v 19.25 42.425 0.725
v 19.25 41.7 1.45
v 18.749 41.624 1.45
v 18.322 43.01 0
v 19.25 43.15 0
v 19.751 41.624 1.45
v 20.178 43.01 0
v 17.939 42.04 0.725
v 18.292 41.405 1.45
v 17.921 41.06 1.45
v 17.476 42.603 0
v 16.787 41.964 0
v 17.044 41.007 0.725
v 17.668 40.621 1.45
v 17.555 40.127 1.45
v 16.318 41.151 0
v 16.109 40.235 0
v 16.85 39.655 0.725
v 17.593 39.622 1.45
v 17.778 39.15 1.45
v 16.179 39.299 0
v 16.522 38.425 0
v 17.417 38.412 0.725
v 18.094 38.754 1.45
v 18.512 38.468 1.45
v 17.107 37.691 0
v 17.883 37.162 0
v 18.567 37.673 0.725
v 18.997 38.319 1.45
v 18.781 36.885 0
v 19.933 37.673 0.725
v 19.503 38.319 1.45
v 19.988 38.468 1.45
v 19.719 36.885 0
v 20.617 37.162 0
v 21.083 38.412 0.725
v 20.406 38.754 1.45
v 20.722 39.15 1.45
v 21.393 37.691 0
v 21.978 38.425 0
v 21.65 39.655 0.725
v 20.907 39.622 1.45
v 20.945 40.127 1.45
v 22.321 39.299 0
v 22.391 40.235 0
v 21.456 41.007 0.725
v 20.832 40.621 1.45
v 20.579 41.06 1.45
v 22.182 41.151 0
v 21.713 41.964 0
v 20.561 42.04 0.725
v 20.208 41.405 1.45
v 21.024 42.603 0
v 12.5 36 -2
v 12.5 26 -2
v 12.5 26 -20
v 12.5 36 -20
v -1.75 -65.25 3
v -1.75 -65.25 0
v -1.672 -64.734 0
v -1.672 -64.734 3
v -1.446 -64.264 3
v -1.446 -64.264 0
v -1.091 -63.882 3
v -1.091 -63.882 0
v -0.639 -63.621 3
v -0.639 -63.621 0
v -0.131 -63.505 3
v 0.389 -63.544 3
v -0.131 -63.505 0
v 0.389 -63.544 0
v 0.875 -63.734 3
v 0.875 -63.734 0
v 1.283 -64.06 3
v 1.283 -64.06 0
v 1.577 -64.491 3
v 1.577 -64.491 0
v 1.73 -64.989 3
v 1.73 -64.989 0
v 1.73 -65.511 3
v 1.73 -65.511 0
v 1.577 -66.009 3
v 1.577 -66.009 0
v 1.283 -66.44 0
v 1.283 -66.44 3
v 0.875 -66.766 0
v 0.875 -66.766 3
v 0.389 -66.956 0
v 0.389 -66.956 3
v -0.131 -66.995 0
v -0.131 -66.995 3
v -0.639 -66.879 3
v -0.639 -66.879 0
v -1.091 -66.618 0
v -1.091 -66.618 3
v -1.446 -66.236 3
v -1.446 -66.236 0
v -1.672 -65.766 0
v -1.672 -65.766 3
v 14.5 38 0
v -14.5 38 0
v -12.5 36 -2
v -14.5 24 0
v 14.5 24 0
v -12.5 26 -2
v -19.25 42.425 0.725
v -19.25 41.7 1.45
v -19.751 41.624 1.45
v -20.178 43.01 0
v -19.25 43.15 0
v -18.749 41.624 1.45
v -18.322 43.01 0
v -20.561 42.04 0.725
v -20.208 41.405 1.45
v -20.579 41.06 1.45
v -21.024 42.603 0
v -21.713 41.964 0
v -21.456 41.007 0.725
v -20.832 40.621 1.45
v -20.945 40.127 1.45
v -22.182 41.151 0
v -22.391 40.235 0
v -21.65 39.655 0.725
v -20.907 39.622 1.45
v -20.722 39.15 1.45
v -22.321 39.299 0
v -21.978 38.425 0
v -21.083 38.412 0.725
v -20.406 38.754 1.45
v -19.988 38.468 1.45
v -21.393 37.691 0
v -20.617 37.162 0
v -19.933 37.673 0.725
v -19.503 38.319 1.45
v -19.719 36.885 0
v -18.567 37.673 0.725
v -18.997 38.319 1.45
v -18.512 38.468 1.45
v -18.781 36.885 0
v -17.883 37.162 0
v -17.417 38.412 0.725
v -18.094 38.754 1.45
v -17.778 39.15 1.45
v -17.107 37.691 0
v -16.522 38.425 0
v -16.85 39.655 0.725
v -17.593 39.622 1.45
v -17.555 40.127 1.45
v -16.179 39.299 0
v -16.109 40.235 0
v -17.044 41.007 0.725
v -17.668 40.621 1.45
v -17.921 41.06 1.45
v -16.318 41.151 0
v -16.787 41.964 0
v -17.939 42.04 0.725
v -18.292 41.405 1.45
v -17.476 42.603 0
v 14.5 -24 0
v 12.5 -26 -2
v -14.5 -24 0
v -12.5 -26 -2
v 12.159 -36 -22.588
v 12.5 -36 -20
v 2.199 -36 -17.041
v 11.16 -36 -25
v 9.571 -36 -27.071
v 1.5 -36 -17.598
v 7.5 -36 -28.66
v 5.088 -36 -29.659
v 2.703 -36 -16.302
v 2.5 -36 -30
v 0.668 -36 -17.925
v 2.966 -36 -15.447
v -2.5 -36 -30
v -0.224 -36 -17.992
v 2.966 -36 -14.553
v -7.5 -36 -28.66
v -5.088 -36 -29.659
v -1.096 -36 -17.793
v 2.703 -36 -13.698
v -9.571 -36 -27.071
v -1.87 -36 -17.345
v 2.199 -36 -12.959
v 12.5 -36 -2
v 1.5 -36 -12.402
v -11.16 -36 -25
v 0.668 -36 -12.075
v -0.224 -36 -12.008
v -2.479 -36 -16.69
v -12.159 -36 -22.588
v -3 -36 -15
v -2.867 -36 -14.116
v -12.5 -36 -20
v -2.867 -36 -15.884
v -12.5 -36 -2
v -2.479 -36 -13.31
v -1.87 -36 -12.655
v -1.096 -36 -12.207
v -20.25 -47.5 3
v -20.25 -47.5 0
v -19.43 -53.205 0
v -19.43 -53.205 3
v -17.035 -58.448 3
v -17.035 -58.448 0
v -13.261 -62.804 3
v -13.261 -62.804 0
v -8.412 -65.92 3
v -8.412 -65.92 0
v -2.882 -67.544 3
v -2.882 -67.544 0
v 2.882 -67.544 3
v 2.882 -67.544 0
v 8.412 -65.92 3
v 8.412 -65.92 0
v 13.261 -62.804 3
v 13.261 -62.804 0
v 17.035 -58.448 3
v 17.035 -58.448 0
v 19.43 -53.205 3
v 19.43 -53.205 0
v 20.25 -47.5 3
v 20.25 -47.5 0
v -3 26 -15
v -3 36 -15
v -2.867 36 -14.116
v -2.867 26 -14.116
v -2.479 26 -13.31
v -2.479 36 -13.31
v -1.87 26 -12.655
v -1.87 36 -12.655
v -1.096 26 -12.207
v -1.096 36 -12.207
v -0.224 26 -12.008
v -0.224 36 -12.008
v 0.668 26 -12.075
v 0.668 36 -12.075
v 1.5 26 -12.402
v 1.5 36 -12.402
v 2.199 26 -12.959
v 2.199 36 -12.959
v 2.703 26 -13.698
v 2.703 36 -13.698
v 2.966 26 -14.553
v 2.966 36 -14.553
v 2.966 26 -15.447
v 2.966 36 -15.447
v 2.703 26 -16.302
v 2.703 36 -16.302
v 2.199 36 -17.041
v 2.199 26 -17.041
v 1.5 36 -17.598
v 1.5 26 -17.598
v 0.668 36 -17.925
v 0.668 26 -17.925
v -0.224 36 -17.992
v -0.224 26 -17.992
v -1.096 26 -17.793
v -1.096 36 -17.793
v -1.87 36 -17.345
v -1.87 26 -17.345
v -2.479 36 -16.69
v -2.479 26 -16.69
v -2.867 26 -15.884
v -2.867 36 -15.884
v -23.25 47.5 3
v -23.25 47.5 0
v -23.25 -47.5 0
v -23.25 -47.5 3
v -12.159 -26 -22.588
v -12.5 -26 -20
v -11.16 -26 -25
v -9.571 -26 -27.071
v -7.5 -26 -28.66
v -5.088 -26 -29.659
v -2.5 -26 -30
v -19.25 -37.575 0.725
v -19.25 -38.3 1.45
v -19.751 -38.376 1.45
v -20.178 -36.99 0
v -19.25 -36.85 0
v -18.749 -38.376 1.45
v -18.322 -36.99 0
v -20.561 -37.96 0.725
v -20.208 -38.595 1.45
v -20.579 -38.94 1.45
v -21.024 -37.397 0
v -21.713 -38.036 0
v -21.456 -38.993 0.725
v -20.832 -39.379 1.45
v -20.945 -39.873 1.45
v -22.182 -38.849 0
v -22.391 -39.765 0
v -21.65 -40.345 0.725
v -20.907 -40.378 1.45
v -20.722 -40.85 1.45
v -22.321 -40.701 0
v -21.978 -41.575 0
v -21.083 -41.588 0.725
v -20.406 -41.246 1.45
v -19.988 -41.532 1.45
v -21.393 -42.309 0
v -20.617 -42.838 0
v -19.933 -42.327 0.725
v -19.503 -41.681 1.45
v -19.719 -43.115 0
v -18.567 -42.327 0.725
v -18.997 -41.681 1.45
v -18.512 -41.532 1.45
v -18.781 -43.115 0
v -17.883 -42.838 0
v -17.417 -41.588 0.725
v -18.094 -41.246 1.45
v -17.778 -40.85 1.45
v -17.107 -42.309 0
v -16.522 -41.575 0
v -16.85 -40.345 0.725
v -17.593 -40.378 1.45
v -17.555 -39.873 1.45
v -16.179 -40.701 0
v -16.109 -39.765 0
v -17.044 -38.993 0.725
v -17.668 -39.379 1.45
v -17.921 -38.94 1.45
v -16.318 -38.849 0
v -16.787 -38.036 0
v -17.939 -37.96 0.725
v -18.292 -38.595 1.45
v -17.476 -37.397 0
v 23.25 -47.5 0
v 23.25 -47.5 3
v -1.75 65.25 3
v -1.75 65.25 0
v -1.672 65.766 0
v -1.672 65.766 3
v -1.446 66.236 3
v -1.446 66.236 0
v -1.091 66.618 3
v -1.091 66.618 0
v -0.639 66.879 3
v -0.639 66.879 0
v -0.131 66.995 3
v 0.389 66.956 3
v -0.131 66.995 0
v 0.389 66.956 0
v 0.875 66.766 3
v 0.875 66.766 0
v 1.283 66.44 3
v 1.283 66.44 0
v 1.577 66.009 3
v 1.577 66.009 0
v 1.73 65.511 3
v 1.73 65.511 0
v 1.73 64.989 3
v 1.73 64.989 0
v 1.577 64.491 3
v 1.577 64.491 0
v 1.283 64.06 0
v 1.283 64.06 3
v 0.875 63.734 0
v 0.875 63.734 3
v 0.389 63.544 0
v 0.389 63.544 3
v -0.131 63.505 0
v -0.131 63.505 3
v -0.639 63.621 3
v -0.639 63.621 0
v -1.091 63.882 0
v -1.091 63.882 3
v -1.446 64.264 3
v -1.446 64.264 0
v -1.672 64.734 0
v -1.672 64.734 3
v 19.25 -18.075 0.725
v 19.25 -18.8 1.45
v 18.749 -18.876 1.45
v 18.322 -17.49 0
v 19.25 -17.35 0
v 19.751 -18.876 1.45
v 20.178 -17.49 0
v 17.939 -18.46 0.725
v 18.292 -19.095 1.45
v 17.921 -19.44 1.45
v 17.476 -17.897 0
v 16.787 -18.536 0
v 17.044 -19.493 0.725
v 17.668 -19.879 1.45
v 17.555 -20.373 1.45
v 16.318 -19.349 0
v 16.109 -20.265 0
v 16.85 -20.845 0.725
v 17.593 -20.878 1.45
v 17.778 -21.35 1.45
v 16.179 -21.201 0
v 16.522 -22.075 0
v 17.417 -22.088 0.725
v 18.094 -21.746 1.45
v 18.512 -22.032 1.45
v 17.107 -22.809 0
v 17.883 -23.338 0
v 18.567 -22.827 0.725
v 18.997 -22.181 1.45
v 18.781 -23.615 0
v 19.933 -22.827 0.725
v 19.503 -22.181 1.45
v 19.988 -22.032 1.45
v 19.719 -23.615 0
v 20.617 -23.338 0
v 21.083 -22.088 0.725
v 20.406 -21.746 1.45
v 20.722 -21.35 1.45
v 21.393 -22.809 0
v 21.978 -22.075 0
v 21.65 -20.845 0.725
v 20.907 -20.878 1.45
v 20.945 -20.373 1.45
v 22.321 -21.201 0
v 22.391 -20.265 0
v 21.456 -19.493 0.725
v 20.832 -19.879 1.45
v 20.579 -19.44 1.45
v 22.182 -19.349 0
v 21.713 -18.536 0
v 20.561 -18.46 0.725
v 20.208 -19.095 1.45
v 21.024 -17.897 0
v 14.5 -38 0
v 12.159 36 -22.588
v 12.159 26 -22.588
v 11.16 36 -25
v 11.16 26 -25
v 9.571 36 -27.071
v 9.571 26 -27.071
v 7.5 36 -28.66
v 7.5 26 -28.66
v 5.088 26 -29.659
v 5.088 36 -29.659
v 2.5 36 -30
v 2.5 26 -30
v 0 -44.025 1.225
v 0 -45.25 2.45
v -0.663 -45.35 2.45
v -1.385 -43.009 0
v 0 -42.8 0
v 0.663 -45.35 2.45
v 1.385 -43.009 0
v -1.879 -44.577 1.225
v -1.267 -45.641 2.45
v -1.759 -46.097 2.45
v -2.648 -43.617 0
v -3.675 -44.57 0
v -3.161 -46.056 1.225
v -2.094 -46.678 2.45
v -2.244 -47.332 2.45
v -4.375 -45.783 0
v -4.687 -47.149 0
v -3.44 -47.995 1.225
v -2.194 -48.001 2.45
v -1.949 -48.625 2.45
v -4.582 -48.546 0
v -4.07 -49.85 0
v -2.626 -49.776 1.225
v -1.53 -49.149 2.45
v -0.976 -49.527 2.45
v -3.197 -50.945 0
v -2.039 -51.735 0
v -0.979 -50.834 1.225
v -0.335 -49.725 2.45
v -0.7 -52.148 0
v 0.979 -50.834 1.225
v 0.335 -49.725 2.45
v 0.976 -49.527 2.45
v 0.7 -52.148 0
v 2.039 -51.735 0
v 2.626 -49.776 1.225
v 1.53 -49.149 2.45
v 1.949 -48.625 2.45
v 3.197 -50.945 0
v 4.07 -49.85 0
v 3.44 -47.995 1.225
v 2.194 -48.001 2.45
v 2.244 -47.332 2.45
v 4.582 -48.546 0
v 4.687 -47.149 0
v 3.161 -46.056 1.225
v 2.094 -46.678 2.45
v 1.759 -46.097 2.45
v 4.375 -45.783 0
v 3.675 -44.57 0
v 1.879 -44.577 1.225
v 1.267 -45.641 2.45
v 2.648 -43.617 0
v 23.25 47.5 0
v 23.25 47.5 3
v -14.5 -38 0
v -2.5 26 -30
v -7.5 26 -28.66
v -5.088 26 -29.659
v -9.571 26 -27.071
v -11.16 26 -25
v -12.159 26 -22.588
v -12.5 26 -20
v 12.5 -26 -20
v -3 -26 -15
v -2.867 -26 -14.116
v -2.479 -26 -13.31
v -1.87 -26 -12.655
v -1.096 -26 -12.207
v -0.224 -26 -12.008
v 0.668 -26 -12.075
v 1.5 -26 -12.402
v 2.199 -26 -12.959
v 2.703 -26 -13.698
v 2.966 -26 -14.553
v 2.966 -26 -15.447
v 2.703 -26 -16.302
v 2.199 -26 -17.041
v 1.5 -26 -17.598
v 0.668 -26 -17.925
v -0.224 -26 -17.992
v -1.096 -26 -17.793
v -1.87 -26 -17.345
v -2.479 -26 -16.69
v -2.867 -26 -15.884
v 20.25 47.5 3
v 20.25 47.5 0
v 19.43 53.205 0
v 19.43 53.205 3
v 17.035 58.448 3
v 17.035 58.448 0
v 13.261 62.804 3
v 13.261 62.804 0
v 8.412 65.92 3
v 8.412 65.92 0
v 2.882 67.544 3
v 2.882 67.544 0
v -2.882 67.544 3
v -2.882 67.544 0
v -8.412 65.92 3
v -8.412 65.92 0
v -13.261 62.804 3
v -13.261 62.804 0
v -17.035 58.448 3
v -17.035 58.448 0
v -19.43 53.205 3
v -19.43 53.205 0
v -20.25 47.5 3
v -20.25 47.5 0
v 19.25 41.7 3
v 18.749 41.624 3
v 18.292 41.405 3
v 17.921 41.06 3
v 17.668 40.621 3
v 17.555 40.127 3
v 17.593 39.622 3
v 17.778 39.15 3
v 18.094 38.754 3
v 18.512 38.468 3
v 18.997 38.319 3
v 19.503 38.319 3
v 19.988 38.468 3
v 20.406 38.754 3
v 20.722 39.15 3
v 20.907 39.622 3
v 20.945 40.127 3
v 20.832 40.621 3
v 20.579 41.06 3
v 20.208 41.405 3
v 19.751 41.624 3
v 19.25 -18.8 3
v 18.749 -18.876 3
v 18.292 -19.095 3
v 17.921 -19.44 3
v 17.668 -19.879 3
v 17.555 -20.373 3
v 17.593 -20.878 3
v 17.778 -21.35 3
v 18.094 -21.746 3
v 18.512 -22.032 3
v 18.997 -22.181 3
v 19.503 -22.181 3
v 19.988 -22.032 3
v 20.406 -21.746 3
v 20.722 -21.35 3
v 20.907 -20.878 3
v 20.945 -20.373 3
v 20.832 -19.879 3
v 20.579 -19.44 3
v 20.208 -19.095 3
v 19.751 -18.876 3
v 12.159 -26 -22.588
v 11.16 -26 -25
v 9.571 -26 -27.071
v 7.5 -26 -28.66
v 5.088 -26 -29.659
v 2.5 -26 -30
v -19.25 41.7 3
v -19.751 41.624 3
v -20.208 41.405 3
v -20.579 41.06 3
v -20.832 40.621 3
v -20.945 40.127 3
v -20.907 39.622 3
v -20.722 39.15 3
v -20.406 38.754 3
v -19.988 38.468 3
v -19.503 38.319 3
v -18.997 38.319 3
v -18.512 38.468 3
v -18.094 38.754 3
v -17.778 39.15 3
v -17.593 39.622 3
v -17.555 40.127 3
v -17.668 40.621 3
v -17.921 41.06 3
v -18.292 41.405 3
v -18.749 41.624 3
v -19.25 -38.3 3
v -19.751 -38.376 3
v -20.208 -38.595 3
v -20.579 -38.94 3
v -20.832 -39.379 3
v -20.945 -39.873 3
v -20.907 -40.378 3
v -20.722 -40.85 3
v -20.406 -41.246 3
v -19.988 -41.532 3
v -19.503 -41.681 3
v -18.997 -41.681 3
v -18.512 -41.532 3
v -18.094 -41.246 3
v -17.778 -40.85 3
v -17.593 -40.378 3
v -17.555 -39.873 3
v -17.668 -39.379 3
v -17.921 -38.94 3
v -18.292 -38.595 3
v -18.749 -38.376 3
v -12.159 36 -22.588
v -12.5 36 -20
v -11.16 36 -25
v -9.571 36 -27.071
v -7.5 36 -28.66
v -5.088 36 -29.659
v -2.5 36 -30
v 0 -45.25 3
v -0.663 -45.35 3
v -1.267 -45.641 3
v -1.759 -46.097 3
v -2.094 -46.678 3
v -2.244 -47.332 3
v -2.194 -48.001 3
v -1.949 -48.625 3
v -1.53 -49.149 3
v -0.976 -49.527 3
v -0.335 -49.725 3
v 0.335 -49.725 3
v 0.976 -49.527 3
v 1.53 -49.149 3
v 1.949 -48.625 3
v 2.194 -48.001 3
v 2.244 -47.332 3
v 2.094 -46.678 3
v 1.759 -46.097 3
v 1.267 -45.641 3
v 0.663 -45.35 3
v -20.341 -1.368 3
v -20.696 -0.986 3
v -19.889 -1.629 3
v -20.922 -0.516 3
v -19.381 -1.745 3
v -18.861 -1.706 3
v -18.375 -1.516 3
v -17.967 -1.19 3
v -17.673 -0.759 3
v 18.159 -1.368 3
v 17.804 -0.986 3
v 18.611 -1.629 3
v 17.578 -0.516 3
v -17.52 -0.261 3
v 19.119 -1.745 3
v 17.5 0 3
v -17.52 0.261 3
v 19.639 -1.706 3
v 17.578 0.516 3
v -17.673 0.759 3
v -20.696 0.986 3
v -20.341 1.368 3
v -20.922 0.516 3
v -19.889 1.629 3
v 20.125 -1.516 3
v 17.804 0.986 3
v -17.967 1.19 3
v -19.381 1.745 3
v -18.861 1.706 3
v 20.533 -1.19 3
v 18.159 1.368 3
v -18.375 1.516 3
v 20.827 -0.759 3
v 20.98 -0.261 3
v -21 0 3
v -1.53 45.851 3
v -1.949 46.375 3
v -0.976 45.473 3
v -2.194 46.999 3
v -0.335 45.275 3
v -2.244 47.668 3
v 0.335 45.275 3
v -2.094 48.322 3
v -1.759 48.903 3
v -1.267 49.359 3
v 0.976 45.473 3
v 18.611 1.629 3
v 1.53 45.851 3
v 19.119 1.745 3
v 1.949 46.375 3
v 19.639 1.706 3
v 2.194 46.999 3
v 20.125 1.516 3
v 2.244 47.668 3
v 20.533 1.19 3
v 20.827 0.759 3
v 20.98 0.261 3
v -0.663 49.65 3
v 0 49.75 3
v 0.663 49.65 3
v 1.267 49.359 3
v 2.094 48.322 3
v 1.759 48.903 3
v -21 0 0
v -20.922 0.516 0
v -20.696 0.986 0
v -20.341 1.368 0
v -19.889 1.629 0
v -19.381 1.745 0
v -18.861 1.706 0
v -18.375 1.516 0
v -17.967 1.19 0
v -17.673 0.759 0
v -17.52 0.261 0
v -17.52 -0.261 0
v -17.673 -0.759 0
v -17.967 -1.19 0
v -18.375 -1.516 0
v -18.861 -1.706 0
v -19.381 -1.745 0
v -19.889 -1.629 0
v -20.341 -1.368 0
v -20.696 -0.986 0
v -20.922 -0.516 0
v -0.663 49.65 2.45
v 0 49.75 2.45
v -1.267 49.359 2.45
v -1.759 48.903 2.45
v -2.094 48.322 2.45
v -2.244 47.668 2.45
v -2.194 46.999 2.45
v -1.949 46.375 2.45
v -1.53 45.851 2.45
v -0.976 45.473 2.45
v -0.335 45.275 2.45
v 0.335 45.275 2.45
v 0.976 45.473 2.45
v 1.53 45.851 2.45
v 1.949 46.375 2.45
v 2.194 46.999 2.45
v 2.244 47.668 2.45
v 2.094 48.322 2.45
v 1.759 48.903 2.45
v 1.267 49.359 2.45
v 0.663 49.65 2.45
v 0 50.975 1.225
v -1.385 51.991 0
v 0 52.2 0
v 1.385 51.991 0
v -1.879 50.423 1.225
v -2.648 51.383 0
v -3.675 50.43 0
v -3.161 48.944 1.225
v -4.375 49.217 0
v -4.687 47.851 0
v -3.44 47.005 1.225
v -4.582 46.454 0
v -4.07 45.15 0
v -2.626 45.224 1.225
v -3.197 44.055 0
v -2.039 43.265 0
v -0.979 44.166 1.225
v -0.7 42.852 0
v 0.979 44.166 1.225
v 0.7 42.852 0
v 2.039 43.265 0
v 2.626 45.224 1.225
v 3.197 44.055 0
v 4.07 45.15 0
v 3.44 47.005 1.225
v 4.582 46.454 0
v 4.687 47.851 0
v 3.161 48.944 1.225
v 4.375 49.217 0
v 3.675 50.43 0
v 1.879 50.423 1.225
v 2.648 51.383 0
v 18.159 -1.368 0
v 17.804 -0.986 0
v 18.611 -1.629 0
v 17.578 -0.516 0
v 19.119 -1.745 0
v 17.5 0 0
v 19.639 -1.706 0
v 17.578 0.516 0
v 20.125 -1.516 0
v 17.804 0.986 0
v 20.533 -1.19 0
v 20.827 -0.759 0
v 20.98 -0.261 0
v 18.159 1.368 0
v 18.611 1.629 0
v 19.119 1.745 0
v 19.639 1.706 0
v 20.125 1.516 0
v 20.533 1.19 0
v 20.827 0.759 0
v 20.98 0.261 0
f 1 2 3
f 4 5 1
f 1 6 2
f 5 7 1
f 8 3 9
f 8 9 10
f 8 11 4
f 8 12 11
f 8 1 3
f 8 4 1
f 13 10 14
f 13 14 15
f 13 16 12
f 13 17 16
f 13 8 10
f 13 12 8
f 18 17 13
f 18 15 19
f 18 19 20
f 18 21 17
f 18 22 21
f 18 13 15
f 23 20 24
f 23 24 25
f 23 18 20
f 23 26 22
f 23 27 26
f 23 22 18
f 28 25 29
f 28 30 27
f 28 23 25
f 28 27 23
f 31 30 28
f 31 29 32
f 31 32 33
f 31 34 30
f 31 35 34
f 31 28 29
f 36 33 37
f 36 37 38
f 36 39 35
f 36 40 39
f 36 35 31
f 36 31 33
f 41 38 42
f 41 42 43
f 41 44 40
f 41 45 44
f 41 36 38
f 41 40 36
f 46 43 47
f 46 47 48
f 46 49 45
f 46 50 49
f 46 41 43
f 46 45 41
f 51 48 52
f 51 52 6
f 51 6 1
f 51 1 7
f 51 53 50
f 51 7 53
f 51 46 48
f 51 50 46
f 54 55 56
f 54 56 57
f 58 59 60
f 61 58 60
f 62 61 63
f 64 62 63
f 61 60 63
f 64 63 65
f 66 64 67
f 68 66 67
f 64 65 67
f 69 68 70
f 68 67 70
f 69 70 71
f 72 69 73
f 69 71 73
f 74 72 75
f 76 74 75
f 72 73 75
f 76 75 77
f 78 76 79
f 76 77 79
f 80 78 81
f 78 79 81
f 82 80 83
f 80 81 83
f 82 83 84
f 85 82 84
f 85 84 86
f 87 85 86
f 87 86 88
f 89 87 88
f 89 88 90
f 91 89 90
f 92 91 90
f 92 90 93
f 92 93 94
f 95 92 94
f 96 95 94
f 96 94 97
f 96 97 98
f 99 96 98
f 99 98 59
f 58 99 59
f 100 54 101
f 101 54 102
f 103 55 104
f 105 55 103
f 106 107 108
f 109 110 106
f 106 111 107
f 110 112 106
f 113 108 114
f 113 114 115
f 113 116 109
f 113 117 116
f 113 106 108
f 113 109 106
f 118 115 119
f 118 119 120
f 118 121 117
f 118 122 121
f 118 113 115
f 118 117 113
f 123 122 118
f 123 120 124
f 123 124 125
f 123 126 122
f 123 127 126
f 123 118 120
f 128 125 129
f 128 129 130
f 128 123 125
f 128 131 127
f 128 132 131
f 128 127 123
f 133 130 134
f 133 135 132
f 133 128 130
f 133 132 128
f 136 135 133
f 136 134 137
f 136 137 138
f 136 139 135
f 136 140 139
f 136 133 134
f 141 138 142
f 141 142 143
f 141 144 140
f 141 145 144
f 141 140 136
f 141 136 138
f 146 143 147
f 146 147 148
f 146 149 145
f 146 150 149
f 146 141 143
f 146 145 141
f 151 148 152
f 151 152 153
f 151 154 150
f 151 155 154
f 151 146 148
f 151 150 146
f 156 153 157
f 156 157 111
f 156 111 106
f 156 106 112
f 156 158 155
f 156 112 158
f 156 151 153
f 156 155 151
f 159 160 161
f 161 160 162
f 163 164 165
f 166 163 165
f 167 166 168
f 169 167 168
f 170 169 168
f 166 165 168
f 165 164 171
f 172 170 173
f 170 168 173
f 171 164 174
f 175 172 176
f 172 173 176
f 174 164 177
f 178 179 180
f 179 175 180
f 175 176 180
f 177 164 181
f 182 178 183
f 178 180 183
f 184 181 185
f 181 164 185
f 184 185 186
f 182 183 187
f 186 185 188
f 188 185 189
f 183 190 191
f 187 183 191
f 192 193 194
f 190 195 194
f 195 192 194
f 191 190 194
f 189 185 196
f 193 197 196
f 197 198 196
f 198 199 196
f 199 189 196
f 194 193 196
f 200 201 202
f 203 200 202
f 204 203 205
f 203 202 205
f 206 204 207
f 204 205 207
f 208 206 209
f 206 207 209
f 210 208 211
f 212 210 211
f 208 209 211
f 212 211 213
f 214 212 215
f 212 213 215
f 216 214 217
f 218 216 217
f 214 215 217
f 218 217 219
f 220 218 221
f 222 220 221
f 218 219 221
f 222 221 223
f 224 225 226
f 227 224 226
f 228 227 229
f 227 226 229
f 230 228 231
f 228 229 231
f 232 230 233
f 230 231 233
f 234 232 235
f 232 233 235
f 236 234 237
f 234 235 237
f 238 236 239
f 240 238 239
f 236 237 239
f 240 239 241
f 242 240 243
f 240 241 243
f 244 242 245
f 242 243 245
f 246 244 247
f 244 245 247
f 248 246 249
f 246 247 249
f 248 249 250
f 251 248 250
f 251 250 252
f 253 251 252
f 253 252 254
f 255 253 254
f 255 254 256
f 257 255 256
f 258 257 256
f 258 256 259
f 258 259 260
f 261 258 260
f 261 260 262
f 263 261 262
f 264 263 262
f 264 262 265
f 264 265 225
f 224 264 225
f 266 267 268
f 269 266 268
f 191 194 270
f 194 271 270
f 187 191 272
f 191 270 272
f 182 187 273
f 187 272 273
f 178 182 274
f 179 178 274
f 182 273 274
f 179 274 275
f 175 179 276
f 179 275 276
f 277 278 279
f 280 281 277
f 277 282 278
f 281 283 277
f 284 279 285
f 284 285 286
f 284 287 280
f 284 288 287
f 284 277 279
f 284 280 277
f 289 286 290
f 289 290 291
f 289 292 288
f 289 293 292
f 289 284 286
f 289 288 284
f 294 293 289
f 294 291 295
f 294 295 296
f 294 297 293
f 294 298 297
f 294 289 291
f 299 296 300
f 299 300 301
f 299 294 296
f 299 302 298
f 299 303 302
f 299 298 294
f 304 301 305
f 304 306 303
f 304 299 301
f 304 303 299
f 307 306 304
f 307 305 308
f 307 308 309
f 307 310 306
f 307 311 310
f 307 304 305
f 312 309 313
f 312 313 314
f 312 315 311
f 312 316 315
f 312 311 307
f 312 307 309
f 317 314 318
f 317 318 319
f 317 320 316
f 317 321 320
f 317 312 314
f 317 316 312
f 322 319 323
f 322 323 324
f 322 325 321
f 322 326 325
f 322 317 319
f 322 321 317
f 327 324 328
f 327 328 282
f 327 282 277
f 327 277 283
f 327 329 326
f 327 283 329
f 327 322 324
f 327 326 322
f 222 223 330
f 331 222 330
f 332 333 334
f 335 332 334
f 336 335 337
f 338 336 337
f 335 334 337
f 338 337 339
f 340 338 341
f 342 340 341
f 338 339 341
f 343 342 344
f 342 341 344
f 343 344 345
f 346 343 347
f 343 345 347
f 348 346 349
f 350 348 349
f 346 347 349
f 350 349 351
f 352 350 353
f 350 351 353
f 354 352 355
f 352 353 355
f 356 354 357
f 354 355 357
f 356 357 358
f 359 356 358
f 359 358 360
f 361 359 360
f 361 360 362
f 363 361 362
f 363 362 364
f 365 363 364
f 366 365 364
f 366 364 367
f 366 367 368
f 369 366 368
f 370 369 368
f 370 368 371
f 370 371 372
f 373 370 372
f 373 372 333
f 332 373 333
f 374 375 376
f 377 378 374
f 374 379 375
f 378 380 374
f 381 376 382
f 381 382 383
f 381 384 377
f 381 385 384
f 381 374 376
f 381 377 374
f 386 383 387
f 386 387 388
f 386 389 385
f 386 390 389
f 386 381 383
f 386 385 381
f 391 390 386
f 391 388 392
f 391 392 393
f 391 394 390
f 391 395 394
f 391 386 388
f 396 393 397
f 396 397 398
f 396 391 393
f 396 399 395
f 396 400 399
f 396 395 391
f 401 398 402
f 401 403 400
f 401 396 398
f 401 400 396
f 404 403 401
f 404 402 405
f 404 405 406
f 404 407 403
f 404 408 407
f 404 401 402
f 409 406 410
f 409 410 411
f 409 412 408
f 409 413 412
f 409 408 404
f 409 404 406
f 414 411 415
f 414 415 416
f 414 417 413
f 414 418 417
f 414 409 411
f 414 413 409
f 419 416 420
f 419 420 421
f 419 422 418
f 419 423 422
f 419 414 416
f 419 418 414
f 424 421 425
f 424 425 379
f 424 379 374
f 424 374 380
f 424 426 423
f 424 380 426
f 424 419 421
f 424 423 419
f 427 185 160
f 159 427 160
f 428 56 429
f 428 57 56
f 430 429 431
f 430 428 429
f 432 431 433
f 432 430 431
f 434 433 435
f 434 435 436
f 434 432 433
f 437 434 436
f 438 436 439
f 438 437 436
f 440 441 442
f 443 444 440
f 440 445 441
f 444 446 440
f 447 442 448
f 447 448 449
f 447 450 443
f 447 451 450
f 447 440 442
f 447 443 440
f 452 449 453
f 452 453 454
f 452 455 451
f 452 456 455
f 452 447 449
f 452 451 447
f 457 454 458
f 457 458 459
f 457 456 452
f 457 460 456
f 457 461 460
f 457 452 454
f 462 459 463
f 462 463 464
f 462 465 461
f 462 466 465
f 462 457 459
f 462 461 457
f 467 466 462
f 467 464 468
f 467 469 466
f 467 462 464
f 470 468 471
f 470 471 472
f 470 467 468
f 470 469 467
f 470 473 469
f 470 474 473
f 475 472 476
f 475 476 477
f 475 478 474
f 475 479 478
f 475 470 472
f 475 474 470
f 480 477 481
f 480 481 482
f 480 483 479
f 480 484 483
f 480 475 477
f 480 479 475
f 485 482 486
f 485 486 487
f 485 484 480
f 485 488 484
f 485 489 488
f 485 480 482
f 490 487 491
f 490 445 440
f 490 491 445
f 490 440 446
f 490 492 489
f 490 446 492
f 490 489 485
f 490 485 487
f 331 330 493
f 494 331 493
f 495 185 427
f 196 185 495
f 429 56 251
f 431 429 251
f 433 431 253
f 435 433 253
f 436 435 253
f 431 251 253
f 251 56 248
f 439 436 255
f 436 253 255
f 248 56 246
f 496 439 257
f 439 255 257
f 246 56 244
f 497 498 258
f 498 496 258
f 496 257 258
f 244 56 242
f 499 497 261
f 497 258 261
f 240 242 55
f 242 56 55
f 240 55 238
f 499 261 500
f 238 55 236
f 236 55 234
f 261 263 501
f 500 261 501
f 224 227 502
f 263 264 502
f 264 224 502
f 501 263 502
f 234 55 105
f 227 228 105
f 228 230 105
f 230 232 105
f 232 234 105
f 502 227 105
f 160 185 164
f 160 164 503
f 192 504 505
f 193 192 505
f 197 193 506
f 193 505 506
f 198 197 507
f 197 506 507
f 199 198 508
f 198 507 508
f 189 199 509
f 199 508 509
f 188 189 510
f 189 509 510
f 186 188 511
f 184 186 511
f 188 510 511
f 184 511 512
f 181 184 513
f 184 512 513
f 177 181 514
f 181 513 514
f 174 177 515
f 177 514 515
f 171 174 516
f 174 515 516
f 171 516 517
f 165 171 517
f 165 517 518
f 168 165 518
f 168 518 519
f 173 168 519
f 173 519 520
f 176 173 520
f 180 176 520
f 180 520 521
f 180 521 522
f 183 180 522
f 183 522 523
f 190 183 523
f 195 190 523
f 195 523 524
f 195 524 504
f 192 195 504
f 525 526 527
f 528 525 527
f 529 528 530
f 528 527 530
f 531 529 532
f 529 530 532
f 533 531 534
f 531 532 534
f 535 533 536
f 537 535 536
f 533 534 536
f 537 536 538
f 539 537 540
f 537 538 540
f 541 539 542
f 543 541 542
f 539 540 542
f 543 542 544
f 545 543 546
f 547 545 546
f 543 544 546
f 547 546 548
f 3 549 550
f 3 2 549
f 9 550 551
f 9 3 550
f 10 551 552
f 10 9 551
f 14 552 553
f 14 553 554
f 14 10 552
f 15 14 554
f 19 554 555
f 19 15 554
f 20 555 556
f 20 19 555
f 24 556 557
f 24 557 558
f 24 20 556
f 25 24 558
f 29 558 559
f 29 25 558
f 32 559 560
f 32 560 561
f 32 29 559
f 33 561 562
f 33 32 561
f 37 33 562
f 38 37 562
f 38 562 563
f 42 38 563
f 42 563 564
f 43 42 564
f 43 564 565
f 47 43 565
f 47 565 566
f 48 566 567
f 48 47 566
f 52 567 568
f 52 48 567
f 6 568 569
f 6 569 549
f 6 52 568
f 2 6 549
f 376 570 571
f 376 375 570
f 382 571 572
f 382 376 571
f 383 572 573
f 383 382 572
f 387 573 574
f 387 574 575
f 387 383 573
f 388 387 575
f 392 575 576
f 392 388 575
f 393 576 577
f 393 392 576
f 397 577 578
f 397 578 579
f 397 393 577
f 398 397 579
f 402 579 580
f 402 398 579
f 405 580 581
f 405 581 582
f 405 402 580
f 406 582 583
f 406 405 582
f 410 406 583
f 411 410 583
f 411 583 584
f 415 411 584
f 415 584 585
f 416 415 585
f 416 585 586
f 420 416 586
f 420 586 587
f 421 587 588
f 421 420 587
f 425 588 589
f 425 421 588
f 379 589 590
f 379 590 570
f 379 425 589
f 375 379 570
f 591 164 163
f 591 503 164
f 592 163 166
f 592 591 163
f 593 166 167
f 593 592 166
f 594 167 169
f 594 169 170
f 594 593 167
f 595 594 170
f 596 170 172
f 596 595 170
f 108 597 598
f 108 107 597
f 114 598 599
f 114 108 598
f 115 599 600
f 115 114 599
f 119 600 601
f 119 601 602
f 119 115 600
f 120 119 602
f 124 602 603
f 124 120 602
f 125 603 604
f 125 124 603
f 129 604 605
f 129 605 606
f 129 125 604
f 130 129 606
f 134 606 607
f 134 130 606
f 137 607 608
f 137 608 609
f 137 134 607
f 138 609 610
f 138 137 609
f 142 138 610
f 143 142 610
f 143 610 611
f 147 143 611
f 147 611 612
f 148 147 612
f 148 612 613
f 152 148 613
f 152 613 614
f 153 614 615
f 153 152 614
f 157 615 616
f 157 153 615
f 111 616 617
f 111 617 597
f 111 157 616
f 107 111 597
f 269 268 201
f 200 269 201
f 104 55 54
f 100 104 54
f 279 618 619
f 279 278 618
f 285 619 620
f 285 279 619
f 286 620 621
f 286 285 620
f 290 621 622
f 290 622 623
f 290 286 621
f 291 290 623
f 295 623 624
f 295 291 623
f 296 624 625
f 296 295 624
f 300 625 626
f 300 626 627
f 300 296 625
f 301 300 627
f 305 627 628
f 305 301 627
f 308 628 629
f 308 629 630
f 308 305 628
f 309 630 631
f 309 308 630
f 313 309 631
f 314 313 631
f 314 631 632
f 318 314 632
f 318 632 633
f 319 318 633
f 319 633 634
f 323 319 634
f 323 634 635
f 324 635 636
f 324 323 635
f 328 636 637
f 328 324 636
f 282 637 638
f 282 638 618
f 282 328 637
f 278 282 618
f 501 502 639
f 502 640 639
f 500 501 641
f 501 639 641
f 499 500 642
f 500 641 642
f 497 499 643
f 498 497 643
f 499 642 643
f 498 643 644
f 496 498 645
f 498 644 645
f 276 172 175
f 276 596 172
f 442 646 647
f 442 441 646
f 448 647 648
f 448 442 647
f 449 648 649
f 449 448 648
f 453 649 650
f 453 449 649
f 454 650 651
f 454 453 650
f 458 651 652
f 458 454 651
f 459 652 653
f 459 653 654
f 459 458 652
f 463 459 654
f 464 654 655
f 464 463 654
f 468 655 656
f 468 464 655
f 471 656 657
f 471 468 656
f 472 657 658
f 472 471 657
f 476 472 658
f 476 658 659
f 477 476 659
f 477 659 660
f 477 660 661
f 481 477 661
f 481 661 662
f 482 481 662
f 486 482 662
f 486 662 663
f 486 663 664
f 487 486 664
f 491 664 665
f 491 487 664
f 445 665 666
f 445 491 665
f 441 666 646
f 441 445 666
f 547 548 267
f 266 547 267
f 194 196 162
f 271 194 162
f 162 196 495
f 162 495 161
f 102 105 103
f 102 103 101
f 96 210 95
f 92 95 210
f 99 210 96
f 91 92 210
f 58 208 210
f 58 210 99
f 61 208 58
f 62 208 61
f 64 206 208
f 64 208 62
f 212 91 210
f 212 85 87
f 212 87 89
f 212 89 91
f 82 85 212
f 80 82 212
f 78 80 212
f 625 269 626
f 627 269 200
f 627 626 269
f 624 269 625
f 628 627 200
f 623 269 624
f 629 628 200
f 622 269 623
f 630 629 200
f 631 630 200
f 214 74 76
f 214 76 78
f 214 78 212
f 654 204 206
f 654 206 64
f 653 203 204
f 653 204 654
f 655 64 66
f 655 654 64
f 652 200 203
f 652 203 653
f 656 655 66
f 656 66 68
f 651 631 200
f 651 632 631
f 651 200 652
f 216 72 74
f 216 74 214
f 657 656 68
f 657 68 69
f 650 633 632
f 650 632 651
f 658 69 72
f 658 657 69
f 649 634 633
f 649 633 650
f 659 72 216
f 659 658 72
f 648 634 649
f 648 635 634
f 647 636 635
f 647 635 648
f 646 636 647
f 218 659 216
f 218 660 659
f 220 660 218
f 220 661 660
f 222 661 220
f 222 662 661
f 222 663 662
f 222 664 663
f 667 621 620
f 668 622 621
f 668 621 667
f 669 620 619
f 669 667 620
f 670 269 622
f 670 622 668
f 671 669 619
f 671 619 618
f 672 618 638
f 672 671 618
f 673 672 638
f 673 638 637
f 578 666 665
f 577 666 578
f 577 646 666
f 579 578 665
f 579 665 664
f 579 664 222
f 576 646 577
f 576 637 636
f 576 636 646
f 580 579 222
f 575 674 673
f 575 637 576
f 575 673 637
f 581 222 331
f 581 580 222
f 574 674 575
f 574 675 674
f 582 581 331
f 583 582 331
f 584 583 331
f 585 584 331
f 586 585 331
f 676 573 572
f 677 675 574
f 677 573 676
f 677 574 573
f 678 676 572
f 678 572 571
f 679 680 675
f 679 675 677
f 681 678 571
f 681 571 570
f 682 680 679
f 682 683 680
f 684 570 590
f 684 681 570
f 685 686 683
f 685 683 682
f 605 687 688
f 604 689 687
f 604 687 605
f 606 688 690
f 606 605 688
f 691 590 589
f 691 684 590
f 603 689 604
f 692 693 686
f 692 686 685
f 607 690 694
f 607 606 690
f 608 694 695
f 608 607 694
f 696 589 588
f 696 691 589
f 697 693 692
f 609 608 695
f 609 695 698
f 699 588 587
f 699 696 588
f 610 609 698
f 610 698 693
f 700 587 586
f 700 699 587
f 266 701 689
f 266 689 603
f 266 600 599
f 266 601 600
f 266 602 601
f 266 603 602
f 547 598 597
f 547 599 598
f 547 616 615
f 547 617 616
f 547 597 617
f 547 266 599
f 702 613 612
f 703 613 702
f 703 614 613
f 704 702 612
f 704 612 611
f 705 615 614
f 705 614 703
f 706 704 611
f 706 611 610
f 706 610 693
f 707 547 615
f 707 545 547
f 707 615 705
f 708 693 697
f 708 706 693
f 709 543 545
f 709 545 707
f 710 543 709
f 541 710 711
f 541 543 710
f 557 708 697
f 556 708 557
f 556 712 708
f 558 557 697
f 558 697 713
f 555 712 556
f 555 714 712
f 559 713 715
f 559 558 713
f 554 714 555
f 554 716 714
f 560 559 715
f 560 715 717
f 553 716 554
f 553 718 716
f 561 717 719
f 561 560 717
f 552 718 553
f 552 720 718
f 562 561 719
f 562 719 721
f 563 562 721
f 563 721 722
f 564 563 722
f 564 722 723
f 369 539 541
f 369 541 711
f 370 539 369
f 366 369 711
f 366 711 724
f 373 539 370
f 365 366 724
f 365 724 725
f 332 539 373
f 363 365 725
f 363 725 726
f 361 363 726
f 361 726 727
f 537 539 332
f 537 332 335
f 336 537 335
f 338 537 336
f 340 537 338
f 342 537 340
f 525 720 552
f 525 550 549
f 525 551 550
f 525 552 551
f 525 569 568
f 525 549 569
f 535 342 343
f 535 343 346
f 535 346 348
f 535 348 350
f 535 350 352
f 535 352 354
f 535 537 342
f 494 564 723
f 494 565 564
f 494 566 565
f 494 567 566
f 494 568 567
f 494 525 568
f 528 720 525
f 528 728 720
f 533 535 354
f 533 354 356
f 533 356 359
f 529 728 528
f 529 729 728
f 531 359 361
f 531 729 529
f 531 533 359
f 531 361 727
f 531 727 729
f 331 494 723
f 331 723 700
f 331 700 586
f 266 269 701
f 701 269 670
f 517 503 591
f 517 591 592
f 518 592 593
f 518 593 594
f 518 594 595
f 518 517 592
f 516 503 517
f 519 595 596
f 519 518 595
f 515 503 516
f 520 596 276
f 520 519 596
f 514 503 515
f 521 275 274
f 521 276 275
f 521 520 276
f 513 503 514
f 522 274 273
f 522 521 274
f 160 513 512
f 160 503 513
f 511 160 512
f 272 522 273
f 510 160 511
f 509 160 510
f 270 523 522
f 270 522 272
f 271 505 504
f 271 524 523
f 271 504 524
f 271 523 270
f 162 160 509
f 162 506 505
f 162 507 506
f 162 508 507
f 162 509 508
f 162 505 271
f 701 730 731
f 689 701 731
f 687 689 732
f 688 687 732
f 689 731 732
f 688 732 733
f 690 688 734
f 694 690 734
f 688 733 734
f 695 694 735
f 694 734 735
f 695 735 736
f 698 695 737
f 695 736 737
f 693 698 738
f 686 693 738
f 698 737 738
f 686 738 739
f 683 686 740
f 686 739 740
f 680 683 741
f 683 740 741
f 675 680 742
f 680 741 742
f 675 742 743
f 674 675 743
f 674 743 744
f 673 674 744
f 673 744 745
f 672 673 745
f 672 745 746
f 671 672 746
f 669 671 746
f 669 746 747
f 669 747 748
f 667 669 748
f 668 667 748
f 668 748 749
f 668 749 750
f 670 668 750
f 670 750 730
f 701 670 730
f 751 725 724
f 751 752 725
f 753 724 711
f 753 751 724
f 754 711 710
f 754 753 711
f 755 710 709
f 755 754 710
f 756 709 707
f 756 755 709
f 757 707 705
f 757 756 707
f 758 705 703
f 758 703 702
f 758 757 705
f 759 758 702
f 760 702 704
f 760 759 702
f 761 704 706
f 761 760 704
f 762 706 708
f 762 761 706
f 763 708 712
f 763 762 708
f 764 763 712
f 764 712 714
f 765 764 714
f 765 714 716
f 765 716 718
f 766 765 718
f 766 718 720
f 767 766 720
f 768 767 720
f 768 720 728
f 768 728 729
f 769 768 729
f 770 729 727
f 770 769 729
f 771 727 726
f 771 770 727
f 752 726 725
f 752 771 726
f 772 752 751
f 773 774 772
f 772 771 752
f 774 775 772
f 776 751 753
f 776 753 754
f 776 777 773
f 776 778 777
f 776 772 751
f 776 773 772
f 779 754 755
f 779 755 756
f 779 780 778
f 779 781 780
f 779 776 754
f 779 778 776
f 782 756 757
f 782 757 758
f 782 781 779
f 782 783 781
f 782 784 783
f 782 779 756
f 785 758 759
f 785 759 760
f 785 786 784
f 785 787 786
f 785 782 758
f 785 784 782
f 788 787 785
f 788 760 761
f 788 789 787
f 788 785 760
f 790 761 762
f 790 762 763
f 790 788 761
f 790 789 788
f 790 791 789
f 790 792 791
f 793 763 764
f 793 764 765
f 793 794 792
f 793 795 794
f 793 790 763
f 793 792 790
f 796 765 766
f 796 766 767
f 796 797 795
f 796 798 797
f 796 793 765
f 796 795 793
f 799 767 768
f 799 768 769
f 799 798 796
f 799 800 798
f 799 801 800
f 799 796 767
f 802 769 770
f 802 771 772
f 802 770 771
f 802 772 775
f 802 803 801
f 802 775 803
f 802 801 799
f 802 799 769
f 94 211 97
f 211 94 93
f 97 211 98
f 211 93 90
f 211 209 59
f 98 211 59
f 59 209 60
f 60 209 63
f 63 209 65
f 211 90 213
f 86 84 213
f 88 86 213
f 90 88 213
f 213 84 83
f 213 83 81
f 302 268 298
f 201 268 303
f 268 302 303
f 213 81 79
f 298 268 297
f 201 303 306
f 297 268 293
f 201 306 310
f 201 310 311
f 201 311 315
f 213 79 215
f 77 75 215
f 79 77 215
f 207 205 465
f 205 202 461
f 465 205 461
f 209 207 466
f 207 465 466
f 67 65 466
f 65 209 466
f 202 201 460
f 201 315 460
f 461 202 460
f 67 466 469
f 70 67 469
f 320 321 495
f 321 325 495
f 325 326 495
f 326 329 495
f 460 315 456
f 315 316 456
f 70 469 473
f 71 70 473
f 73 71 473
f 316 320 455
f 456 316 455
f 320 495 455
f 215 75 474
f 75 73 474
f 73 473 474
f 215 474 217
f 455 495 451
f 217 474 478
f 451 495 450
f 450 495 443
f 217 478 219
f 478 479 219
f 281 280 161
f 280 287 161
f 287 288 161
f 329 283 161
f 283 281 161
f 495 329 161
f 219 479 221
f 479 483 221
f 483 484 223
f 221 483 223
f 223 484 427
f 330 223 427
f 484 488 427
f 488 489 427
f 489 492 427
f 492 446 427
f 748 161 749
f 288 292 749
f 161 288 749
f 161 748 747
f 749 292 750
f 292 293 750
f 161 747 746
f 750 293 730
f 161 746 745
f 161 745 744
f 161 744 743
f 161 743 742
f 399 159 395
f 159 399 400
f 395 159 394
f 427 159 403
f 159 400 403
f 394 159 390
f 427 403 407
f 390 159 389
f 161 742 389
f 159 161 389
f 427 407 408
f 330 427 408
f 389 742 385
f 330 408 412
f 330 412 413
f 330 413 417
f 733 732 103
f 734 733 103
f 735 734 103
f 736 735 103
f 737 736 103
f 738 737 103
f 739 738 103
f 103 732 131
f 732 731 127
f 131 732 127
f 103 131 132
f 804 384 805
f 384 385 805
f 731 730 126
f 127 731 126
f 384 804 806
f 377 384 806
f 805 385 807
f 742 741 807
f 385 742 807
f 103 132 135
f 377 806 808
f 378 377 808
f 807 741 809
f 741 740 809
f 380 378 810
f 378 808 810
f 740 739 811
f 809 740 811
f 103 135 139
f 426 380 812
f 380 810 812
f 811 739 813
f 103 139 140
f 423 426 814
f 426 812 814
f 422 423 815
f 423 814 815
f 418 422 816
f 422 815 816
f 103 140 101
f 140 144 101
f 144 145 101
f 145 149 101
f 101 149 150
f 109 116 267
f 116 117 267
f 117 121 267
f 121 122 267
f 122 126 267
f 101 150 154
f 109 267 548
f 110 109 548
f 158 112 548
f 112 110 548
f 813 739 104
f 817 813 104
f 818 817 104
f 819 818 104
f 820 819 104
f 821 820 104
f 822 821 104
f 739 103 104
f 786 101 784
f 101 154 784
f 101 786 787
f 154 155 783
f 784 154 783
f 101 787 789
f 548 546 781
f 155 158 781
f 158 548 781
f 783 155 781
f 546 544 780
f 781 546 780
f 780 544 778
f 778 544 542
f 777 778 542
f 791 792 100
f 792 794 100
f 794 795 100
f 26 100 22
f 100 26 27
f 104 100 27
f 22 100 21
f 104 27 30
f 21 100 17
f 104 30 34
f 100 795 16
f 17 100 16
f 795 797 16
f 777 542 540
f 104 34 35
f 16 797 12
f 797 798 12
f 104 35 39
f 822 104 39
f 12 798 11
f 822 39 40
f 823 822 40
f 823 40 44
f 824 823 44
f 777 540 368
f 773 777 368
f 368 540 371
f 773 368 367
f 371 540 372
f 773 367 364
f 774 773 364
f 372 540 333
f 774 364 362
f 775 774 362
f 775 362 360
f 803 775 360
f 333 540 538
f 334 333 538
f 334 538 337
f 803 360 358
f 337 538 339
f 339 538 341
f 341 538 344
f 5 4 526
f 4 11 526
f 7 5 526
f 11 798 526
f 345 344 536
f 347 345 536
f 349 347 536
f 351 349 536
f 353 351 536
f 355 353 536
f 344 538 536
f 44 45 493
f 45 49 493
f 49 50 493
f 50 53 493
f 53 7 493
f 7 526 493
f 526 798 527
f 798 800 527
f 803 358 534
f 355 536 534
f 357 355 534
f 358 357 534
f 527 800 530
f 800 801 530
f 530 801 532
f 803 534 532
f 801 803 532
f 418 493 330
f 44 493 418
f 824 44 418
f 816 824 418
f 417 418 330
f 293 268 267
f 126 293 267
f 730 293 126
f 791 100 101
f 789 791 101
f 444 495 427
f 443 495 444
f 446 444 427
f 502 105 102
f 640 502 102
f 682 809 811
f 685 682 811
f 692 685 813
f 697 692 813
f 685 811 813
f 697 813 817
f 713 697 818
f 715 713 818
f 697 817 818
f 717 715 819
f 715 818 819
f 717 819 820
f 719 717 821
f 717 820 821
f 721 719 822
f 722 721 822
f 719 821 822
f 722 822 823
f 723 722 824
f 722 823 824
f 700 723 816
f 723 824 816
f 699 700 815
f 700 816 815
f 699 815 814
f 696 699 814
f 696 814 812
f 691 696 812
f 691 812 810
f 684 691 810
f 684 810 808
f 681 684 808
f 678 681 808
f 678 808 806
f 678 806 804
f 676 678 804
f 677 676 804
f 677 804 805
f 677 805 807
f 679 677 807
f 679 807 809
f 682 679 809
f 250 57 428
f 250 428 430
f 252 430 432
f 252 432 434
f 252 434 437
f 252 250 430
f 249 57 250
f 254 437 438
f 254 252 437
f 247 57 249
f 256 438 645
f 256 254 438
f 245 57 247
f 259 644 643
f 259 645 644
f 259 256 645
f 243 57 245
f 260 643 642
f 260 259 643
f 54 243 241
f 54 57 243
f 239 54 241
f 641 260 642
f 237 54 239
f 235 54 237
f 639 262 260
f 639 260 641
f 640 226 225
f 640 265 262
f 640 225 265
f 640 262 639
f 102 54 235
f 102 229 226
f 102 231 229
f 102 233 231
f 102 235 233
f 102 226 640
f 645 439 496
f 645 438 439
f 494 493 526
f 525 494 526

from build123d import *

# Parameters (mm, degrees)
ESTRUSIONE_ESTRUSIONE1_DEPTH          = 3
FORO_SVASATO_PER_VITE_M4_1_AT_2_COUNT = 2
FORO_SVASATO_PER_VITE_M4_1_AT_2_PITCH = 95
FORO_SVASATO_PER_VITE_M3_1_AT_2_COUNT = 2
FORO_SVASATO_PER_VITE_M3_1_AT_2_PITCH = 60.5
FORO_SVASATO_PER_VITE_M3_1_AT_3_COUNT = 2
FORO_SVASATO_PER_VITE_M3_1_AT_3_PITCH = 88.782036471
FORO_SVASATO_PER_VITE_M3_1_AT_4_COUNT = 2
FORO_SVASATO_PER_VITE_M3_1_AT_4_PITCH = 38.5
TAGLIO_ESTRUSIONE2_REACH              = 73.691
SCHIZZO9_R                            = 1.75
SKETCH4_W                             = 25
SKETCH4_H                             = 10
BOSS_EXTRUDE3_DEPTH                   = 30
SKETCH6_R                             = 3
CUT_EXTRUDE2_DEPTH                    = 111.474544579
CHAMFER1_SIZE                         = 2
FILLET1_R                             = 10


with BuildPart() as part:
    # Schizzo1 → Estrusione-Estrusione1 (new body)
    with BuildSketch(Plane.XY):
        with BuildLine():
            Line((20.25, -47.5), (23.25, -47.5))
            Line((23.25, -47.5), (23.25, 47.5))
            Line((23.25, 47.5), (20.25, 47.5))
            ThreePointArc((20.25, 47.5), (0, 67.75), (-20.25, 47.5))
            Line((-20.25, 47.5), (-23.25, 47.5))
            Line((-23.25, 47.5), (-23.25, -47.5))
            Line((-23.25, -47.5), (-20.25, -47.5))
            ThreePointArc((-20.25, -47.5), (0, -67.75), (20.25, -47.5))
        make_face()
    extrude(amount=ESTRUSIONE_ESTRUSIONE1_DEPTH)

    # Schizzo5 → Foro svasato per Vite M4-1 (revolve, cut)
    with BuildSketch(Plane(origin=(0, 47.5, 0), x_dir=(0, 1, 0), z_dir=(1, 0, 0))):
        Polygon((0, 0), (0, 3), (2.25, 3), (2.25, 2.45), (4.7, 0), align=None)
    foro_svasato_per_vite_m4_1 = revolve(axis=Axis((0, 47.5, -6.35), (0, 0, 1)), mode=Mode.SUBTRACT)

    # Foro svasato per Vite M4-1 at 2: Foro svasato per Vite M4-1 ×2
    with Locations(*[(0, -i * FORO_SVASATO_PER_VITE_M4_1_AT_2_PITCH, 0) for i in range(1, FORO_SVASATO_PER_VITE_M4_1_AT_2_COUNT)]):
        add(foro_svasato_per_vite_m4_1, mode=Mode.SUBTRACT)

    # Schizzo8 → Foro svasato per Vite M3-1 (revolve, cut)
    with BuildSketch(Plane(origin=(19.25, 40, 0), x_dir=(0, 1, 0), z_dir=(1, 0, 0))):
        Polygon((0, 0), (0, 3), (1.7, 3), (1.7, 1.45), (3.15, 0), align=None)
    foro_svasato_per_vite_m3_1 = revolve(axis=Axis((19.25, 40, -6.35), (0, 0, 1)), mode=Mode.SUBTRACT)

    # Foro svasato per Vite M3-1 at 2: Foro svasato per Vite M3-1 ×2
    with Locations(*[(0, -i * FORO_SVASATO_PER_VITE_M3_1_AT_2_PITCH, 0) for i in range(1, FORO_SVASATO_PER_VITE_M3_1_AT_2_COUNT)]):
        add(foro_svasato_per_vite_m3_1, mode=Mode.SUBTRACT)

    # Foro svasato per Vite M3-1 at 3: Foro svasato per Vite M3-1 ×2
    with Locations(*[Vector(-0.43364628172754605, -0.9010831828104849, 0) * (i * FORO_SVASATO_PER_VITE_M3_1_AT_3_PITCH) for i in range(1, FORO_SVASATO_PER_VITE_M3_1_AT_3_COUNT)]):
        add(foro_svasato_per_vite_m3_1, mode=Mode.SUBTRACT)

    # Foro svasato per Vite M3-1 at 4: Foro svasato per Vite M3-1 ×2
    with Locations(*[(-i * FORO_SVASATO_PER_VITE_M3_1_AT_4_PITCH, 0, 0) for i in range(1, FORO_SVASATO_PER_VITE_M3_1_AT_4_COUNT)]):
        add(foro_svasato_per_vite_m3_1, mode=Mode.SUBTRACT)

    # Schizzo9 → Taglio-Estrusione2 (cut, up to next)
    with BuildSketch(Plane(origin=(0, 0, 0), x_dir=(-1, 0, 0), z_dir=(0, 0, -1)), mode=Mode.PRIVATE) as taglio_estrusione2_sk1:
        with Locations((-19.25, 0)):
            Circle(SCHIZZO9_R)
    taglio_estrusione2_tool1 = extrude(taglio_estrusione2_sk1.sketch, amount=-TAGLIO_ESTRUSIONE2_REACH, mode=Mode.PRIVATE) & part.part
    # Schizzo9 → Taglio-Estrusione2 (cut, up to next)
    with BuildSketch(Plane(origin=(0, 0, 0), x_dir=(-1, 0, 0), z_dir=(0, 0, -1)), mode=Mode.PRIVATE) as taglio_estrusione2_sk2:
        with Locations((19.25, 0)):
            Circle(SCHIZZO9_R)
    taglio_estrusione2_tool2 = extrude(taglio_estrusione2_sk2.sketch, amount=-TAGLIO_ESTRUSIONE2_REACH, mode=Mode.PRIVATE) & part.part
    # Schizzo9 → Taglio-Estrusione2 (cut, up to next)
    with BuildSketch(Plane(origin=(0, 0, 0), x_dir=(-1, 0, 0), z_dir=(0, 0, -1)), mode=Mode.PRIVATE) as taglio_estrusione2_sk3:
        with Locations((0, 65.25)):
            Circle(SCHIZZO9_R)
    taglio_estrusione2_tool3 = extrude(taglio_estrusione2_sk3.sketch, amount=-TAGLIO_ESTRUSIONE2_REACH, mode=Mode.PRIVATE) & part.part
    # Schizzo9 → Taglio-Estrusione2 (cut, up to next)
    with BuildSketch(Plane(origin=(0, 0, 0), x_dir=(-1, 0, 0), z_dir=(0, 0, -1)), mode=Mode.PRIVATE) as taglio_estrusione2_sk4:
        with Locations((0, -65.25)):
            Circle(SCHIZZO9_R)
    taglio_estrusione2_tool4 = extrude(taglio_estrusione2_sk4.sketch, amount=-TAGLIO_ESTRUSIONE2_REACH, mode=Mode.PRIVATE) & part.part
    add(taglio_estrusione2_tool1.solids().sort_by_distance((19.25, 0, 0))[0], mode=Mode.SUBTRACT)
    add(taglio_estrusione2_tool2.solids().sort_by_distance((-19.25, 0, 0))[0], mode=Mode.SUBTRACT)
    add(taglio_estrusione2_tool3.solids().sort_by_distance((0, 65.25, 0))[0], mode=Mode.SUBTRACT)
    add(taglio_estrusione2_tool4.solids().sort_by_distance((0, -65.25, 0))[0], mode=Mode.SUBTRACT)

    # Sketch4 → Boss-Extrude3 (add)
    with BuildSketch(Plane(origin=(0, 0, 0), x_dir=(-1, 0, 0), z_dir=(0, 0, -1))):
        with Locations((0, 31)):
            Rectangle(SKETCH4_W, SKETCH4_H)
        with Locations((0, -31)):
            Rectangle(SKETCH4_W, SKETCH4_H)
    extrude(amount=BOSS_EXTRUDE3_DEPTH)

    # Sketch6 → Cut-Extrude2 (cut, through all)
    with BuildSketch(Plane(origin=(0, 36, 0), x_dir=(1, 0, 0), z_dir=(0, 1, 0))):
        with Locations(Location((0, 15, 0), (0, 0, 180))):
            Circle(SKETCH6_R)
    extrude(amount=-CUT_EXTRUDE2_DEPTH, mode=Mode.SUBTRACT)

    # Chamfer1
    chamfer1_edges = [part.edges().sort_by_distance(p)[0] for p in [
        (-12.5, 31, 0),
        (0, 36, 0),
        (12.5, 31, 0),
        (0, 26, 0),
        (0, -26, 0),
        (12.5, -31, 0),
        (0, -36, 0),
        (-12.5, -31, 0),
    ]]
    chamfer(chamfer1_edges, length=CHAMFER1_SIZE)

    # Fillet1
    fillet1_edges = [part.edges().sort_by_distance(p)[0] for p in [
        (-12.5, -31, -30),
        (-12.5, 31, -30),
        (12.5, 31, -30),
        (12.5, -31, -30),
    ]]
    fillet(fillet1_edges, radius=FILLET1_R)


solid = part.part
